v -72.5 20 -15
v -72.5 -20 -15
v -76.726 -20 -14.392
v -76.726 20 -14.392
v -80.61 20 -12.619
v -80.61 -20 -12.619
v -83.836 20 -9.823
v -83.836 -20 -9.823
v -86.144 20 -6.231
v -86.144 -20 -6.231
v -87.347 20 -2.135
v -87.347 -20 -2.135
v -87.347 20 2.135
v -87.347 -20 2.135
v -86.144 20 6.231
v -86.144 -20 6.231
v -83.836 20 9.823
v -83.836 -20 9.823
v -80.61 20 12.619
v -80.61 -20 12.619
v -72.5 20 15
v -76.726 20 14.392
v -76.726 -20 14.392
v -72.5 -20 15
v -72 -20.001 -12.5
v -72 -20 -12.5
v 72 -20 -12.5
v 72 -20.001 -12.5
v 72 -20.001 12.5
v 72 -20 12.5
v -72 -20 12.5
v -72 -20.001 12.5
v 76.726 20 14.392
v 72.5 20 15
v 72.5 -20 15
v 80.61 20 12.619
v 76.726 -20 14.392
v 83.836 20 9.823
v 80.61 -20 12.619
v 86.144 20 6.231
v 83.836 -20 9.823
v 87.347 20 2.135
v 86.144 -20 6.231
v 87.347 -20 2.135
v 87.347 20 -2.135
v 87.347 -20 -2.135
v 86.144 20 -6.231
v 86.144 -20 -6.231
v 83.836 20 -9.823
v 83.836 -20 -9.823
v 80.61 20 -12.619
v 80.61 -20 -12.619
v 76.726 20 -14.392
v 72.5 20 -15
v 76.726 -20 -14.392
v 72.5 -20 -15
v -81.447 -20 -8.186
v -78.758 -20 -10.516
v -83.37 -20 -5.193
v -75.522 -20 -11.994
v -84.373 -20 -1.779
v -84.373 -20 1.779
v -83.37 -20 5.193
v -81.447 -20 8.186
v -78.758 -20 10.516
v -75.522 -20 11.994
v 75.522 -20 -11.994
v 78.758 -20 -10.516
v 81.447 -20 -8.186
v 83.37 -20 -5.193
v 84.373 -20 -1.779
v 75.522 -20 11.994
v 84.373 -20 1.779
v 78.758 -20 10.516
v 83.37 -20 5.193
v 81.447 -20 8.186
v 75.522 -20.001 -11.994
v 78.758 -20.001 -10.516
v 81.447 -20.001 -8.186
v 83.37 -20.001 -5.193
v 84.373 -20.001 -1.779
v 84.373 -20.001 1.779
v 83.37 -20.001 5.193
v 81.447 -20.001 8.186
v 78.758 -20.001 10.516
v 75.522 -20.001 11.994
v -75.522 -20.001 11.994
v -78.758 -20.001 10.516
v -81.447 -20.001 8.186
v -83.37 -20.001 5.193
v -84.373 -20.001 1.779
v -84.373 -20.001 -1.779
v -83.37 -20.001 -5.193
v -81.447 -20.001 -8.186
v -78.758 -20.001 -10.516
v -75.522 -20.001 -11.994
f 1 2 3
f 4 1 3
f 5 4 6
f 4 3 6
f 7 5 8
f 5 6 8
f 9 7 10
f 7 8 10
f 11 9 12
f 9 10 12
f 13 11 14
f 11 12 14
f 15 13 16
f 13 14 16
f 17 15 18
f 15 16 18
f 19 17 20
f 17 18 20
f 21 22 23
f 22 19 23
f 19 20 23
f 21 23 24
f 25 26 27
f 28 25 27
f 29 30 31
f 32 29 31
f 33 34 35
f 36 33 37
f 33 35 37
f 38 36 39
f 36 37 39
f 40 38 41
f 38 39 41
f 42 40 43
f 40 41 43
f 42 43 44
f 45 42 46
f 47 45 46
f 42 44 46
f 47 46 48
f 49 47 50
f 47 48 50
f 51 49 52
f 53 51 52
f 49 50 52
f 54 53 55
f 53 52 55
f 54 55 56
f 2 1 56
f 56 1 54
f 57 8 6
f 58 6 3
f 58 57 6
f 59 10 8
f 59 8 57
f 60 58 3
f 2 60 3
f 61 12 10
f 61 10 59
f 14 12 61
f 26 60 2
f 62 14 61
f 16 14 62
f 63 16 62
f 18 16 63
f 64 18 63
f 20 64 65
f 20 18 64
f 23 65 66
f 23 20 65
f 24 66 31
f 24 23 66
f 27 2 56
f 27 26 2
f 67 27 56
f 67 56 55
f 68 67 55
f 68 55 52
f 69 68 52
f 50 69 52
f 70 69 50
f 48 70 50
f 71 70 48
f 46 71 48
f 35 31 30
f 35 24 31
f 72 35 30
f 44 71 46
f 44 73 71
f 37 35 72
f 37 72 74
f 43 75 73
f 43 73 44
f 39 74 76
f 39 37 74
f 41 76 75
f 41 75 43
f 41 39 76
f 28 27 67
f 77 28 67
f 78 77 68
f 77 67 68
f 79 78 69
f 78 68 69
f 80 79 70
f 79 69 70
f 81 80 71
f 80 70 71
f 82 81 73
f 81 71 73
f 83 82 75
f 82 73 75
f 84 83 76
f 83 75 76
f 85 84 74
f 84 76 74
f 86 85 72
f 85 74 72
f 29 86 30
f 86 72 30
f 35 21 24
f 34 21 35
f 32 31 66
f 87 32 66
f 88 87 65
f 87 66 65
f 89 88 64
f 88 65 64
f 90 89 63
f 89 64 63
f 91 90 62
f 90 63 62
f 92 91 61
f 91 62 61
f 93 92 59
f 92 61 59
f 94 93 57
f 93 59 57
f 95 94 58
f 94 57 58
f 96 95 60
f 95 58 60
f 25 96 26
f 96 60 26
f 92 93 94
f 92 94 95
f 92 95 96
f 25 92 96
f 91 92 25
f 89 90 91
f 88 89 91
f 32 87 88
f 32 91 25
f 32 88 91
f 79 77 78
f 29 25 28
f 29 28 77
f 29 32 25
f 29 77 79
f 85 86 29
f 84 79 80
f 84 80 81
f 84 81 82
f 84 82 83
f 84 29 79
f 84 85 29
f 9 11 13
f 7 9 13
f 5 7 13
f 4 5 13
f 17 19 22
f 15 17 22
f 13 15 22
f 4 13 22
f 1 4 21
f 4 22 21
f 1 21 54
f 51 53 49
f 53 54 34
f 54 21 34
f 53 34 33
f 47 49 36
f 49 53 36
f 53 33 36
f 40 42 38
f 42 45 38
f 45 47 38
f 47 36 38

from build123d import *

# Parameters (mm, degrees)
F0_W     = 175
F0_H     = 40
F1_DEPTH = 15
F3_DEPTH = 50.8
F5_DEPTH = 0.001


# Not quite as in the source:
# - a feature names something its author has since deleted; it is built from what else it names


with BuildPart() as f1:
    # F0 (on Top) → F1 (new body, symmetric)
    with BuildSketch(Plane.XY):
        Rectangle(F0_W, F0_H)
    extrude(amount=F1_DEPTH, both=True)

    # F2 (on face) → F3 (cut)
    with BuildSketch(Plane.XZ.offset(20)):
        with BuildLine():
            ThreePointArc((-87.5, 0), (-83.1066017178, 10.6066017178), (-72.5, 15))
            Line((-72.5, 15), (-87.5, 15))
            Line((-87.5, 15), (-87.5, 0))
        make_face()
        with BuildLine():
            Line((-87.5, -15), (-72.5, -15))
            ThreePointArc((-72.5, -15), (-83.1066017178, -10.6066017178), (-87.5, 0))
            Line((-87.5, 0), (-87.5, -15))
        make_face()
        with BuildLine():
            ThreePointArc((87.5, 0), (83.1066017178, -10.6066017178), (72.5, -15))
            Line((72.5, -15), (87.5, -15))
            Line((87.5, -15), (87.5, 0))
        make_face()
        with BuildLine():
            Line((87.5, 15), (72.5, 15))
            ThreePointArc((72.5, 15), (83.1066017178, 10.6066017178), (87.5, 0))
            Line((87.5, 0), (87.5, 15))
        make_face()
    extrude(amount=-F3_DEPTH, mode=Mode.SUBTRACT)

    # F4 (on face) → F5 (join)
    with BuildSketch(Plane.XZ.offset(20)):
        with BuildLine():
            Line((72, 12.5), (-72, 12.5))
            ThreePointArc((-72, 12.5), (-84.5, 0), (-72, -12.5))
            Line((-72, -12.5), (0, -12.5))
            Line((0, -12.5), (72, -12.5))
            ThreePointArc((72, -12.5), (84.5, 0), (72, 12.5))
        make_face()
    extrude(amount=F5_DEPTH)


solid = f1.part
